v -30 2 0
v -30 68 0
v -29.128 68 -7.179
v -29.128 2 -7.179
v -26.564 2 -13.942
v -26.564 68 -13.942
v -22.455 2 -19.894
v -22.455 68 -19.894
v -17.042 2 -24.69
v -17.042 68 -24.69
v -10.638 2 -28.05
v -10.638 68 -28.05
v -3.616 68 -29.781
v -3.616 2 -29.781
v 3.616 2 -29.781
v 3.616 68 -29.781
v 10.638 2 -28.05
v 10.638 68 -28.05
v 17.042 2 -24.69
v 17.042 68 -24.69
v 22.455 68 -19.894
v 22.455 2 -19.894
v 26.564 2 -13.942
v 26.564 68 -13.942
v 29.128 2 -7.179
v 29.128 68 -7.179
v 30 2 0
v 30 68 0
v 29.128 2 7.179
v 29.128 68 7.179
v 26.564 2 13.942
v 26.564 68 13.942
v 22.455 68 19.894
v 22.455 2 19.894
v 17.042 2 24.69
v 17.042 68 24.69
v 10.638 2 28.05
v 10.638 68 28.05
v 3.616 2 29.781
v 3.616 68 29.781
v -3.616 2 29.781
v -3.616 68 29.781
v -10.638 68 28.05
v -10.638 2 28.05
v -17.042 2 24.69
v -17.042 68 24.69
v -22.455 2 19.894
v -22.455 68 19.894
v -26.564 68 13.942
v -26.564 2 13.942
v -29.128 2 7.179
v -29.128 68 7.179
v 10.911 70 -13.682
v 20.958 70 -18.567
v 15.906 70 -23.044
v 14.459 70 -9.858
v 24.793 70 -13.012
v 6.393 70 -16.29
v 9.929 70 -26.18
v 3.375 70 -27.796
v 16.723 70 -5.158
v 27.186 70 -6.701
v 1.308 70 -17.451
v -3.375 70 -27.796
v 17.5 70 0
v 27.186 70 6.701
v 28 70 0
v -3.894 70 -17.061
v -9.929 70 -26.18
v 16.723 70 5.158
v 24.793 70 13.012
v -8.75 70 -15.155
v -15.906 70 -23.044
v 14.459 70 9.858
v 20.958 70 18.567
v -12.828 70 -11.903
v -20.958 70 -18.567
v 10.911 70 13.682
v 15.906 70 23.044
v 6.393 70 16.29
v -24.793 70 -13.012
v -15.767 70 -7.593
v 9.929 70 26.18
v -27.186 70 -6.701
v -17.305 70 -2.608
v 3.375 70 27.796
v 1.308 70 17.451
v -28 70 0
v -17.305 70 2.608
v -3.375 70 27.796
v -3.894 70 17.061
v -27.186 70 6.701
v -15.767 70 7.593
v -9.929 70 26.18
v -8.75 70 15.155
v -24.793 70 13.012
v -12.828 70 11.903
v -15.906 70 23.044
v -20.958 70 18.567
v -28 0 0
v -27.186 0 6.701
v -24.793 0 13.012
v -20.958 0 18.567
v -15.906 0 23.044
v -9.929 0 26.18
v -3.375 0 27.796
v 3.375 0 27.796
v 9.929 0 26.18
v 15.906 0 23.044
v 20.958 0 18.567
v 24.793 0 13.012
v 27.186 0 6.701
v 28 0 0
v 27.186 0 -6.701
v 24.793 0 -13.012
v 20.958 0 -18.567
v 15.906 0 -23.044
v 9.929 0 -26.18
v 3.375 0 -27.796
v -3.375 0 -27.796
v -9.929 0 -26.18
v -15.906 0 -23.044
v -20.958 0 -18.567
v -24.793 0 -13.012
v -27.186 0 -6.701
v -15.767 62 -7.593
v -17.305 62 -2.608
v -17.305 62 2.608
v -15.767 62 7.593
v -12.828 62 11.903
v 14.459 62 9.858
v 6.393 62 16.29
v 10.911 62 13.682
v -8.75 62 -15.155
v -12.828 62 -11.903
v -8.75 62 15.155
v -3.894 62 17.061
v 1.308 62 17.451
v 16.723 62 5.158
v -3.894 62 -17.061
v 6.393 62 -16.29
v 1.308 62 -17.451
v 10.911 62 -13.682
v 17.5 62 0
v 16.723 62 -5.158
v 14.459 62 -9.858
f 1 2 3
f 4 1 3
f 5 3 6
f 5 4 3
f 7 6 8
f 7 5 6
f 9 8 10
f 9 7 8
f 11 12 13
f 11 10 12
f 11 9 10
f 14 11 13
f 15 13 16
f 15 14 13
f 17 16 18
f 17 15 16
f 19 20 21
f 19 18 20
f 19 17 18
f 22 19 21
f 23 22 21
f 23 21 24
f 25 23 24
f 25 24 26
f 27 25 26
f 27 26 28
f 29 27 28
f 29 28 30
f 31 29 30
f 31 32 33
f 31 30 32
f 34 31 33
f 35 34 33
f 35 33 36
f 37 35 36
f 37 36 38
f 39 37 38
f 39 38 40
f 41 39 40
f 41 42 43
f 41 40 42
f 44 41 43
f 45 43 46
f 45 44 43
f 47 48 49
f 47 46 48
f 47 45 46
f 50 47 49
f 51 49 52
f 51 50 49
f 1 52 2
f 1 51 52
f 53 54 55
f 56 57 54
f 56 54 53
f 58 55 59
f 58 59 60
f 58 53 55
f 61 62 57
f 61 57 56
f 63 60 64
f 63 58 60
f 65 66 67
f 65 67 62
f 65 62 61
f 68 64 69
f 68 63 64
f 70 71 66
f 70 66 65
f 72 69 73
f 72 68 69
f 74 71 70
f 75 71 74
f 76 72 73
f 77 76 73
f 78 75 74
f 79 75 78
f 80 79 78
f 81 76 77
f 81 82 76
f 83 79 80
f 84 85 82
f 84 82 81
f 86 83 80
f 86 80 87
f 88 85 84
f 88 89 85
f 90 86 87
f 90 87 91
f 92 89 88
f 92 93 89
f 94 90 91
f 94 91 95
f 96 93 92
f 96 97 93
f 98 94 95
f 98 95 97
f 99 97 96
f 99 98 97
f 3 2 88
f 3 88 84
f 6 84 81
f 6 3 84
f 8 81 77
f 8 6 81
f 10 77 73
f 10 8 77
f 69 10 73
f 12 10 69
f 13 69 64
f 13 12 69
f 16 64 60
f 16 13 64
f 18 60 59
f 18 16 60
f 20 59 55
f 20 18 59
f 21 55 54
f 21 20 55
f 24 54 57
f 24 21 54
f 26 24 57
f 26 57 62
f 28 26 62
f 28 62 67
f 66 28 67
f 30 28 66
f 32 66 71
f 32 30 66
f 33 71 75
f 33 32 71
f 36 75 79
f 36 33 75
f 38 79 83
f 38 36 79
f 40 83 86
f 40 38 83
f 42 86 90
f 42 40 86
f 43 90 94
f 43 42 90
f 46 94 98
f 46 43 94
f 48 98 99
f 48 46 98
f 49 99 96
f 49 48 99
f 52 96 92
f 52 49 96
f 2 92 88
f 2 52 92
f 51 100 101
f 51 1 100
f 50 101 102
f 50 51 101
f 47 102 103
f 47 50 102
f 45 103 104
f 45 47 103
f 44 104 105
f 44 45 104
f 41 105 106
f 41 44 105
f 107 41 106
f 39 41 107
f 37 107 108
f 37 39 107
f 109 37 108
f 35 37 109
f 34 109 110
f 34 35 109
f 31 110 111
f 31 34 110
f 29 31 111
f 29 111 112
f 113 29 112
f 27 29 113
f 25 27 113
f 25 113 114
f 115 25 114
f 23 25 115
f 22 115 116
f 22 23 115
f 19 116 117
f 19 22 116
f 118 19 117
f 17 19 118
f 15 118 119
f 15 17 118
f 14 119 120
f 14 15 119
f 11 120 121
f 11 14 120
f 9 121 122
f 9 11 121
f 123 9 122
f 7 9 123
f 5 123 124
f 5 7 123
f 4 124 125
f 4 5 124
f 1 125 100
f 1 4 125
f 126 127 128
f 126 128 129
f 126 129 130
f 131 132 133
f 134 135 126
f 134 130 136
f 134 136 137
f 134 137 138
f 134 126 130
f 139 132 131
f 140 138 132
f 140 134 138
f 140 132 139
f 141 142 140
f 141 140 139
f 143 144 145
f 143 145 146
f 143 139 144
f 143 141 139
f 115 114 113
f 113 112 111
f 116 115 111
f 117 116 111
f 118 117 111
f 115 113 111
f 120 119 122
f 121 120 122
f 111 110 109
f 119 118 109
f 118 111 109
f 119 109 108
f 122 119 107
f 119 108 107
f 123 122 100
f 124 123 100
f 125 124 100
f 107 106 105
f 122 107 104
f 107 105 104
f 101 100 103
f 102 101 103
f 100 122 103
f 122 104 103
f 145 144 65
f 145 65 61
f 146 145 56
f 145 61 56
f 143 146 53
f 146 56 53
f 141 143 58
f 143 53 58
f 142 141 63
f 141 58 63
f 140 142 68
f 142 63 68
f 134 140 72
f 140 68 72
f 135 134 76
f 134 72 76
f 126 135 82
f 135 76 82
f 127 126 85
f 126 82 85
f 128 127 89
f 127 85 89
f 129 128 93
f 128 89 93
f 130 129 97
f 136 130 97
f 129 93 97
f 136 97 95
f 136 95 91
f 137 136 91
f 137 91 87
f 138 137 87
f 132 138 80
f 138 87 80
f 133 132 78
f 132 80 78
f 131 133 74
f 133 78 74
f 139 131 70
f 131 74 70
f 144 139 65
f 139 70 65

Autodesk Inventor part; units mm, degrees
ref_plane "YZ Plane" through (0, 0, 0) normal (1, 0, 0) x (0, 1, 0)
ref_plane "XZ Plane" through (0, 0, 0) normal (0, 1, 0) x (-1, 0, 0)
ref_plane "XY Plane" through (0, 0, 0) normal (0, 0, 1) x (1, 0, 0)
sketch "Sketch1" plane through (0, 0, 0) normal (0, 1, 0) x (-1, 0, 0)
  circle A0 centre (0, 0) radius 30
  dimension "Stand_Diameter" = 60
extrude "Extrusion1" add sketch "Sketch1" along normal blind 70
sketch "Sketch2" plane through (0, 70, 0) normal (0, 1, 0) x (1, 0, 0)
  circle A0 centre (0, 0) radius 30 projected
  circle A1 centre (0, 0) radius 17.5
  dimension "d5" = 35
extrude "Extrusion2" cut sketch "Sketch2" against normal blind 8 contours A1
chamfer "Chamfer1" distance 2 angle 45 2 edges at (30, 70, 0) (30, 0, 0)
properties part number "StandGreen" material "Wood (Oak)"
